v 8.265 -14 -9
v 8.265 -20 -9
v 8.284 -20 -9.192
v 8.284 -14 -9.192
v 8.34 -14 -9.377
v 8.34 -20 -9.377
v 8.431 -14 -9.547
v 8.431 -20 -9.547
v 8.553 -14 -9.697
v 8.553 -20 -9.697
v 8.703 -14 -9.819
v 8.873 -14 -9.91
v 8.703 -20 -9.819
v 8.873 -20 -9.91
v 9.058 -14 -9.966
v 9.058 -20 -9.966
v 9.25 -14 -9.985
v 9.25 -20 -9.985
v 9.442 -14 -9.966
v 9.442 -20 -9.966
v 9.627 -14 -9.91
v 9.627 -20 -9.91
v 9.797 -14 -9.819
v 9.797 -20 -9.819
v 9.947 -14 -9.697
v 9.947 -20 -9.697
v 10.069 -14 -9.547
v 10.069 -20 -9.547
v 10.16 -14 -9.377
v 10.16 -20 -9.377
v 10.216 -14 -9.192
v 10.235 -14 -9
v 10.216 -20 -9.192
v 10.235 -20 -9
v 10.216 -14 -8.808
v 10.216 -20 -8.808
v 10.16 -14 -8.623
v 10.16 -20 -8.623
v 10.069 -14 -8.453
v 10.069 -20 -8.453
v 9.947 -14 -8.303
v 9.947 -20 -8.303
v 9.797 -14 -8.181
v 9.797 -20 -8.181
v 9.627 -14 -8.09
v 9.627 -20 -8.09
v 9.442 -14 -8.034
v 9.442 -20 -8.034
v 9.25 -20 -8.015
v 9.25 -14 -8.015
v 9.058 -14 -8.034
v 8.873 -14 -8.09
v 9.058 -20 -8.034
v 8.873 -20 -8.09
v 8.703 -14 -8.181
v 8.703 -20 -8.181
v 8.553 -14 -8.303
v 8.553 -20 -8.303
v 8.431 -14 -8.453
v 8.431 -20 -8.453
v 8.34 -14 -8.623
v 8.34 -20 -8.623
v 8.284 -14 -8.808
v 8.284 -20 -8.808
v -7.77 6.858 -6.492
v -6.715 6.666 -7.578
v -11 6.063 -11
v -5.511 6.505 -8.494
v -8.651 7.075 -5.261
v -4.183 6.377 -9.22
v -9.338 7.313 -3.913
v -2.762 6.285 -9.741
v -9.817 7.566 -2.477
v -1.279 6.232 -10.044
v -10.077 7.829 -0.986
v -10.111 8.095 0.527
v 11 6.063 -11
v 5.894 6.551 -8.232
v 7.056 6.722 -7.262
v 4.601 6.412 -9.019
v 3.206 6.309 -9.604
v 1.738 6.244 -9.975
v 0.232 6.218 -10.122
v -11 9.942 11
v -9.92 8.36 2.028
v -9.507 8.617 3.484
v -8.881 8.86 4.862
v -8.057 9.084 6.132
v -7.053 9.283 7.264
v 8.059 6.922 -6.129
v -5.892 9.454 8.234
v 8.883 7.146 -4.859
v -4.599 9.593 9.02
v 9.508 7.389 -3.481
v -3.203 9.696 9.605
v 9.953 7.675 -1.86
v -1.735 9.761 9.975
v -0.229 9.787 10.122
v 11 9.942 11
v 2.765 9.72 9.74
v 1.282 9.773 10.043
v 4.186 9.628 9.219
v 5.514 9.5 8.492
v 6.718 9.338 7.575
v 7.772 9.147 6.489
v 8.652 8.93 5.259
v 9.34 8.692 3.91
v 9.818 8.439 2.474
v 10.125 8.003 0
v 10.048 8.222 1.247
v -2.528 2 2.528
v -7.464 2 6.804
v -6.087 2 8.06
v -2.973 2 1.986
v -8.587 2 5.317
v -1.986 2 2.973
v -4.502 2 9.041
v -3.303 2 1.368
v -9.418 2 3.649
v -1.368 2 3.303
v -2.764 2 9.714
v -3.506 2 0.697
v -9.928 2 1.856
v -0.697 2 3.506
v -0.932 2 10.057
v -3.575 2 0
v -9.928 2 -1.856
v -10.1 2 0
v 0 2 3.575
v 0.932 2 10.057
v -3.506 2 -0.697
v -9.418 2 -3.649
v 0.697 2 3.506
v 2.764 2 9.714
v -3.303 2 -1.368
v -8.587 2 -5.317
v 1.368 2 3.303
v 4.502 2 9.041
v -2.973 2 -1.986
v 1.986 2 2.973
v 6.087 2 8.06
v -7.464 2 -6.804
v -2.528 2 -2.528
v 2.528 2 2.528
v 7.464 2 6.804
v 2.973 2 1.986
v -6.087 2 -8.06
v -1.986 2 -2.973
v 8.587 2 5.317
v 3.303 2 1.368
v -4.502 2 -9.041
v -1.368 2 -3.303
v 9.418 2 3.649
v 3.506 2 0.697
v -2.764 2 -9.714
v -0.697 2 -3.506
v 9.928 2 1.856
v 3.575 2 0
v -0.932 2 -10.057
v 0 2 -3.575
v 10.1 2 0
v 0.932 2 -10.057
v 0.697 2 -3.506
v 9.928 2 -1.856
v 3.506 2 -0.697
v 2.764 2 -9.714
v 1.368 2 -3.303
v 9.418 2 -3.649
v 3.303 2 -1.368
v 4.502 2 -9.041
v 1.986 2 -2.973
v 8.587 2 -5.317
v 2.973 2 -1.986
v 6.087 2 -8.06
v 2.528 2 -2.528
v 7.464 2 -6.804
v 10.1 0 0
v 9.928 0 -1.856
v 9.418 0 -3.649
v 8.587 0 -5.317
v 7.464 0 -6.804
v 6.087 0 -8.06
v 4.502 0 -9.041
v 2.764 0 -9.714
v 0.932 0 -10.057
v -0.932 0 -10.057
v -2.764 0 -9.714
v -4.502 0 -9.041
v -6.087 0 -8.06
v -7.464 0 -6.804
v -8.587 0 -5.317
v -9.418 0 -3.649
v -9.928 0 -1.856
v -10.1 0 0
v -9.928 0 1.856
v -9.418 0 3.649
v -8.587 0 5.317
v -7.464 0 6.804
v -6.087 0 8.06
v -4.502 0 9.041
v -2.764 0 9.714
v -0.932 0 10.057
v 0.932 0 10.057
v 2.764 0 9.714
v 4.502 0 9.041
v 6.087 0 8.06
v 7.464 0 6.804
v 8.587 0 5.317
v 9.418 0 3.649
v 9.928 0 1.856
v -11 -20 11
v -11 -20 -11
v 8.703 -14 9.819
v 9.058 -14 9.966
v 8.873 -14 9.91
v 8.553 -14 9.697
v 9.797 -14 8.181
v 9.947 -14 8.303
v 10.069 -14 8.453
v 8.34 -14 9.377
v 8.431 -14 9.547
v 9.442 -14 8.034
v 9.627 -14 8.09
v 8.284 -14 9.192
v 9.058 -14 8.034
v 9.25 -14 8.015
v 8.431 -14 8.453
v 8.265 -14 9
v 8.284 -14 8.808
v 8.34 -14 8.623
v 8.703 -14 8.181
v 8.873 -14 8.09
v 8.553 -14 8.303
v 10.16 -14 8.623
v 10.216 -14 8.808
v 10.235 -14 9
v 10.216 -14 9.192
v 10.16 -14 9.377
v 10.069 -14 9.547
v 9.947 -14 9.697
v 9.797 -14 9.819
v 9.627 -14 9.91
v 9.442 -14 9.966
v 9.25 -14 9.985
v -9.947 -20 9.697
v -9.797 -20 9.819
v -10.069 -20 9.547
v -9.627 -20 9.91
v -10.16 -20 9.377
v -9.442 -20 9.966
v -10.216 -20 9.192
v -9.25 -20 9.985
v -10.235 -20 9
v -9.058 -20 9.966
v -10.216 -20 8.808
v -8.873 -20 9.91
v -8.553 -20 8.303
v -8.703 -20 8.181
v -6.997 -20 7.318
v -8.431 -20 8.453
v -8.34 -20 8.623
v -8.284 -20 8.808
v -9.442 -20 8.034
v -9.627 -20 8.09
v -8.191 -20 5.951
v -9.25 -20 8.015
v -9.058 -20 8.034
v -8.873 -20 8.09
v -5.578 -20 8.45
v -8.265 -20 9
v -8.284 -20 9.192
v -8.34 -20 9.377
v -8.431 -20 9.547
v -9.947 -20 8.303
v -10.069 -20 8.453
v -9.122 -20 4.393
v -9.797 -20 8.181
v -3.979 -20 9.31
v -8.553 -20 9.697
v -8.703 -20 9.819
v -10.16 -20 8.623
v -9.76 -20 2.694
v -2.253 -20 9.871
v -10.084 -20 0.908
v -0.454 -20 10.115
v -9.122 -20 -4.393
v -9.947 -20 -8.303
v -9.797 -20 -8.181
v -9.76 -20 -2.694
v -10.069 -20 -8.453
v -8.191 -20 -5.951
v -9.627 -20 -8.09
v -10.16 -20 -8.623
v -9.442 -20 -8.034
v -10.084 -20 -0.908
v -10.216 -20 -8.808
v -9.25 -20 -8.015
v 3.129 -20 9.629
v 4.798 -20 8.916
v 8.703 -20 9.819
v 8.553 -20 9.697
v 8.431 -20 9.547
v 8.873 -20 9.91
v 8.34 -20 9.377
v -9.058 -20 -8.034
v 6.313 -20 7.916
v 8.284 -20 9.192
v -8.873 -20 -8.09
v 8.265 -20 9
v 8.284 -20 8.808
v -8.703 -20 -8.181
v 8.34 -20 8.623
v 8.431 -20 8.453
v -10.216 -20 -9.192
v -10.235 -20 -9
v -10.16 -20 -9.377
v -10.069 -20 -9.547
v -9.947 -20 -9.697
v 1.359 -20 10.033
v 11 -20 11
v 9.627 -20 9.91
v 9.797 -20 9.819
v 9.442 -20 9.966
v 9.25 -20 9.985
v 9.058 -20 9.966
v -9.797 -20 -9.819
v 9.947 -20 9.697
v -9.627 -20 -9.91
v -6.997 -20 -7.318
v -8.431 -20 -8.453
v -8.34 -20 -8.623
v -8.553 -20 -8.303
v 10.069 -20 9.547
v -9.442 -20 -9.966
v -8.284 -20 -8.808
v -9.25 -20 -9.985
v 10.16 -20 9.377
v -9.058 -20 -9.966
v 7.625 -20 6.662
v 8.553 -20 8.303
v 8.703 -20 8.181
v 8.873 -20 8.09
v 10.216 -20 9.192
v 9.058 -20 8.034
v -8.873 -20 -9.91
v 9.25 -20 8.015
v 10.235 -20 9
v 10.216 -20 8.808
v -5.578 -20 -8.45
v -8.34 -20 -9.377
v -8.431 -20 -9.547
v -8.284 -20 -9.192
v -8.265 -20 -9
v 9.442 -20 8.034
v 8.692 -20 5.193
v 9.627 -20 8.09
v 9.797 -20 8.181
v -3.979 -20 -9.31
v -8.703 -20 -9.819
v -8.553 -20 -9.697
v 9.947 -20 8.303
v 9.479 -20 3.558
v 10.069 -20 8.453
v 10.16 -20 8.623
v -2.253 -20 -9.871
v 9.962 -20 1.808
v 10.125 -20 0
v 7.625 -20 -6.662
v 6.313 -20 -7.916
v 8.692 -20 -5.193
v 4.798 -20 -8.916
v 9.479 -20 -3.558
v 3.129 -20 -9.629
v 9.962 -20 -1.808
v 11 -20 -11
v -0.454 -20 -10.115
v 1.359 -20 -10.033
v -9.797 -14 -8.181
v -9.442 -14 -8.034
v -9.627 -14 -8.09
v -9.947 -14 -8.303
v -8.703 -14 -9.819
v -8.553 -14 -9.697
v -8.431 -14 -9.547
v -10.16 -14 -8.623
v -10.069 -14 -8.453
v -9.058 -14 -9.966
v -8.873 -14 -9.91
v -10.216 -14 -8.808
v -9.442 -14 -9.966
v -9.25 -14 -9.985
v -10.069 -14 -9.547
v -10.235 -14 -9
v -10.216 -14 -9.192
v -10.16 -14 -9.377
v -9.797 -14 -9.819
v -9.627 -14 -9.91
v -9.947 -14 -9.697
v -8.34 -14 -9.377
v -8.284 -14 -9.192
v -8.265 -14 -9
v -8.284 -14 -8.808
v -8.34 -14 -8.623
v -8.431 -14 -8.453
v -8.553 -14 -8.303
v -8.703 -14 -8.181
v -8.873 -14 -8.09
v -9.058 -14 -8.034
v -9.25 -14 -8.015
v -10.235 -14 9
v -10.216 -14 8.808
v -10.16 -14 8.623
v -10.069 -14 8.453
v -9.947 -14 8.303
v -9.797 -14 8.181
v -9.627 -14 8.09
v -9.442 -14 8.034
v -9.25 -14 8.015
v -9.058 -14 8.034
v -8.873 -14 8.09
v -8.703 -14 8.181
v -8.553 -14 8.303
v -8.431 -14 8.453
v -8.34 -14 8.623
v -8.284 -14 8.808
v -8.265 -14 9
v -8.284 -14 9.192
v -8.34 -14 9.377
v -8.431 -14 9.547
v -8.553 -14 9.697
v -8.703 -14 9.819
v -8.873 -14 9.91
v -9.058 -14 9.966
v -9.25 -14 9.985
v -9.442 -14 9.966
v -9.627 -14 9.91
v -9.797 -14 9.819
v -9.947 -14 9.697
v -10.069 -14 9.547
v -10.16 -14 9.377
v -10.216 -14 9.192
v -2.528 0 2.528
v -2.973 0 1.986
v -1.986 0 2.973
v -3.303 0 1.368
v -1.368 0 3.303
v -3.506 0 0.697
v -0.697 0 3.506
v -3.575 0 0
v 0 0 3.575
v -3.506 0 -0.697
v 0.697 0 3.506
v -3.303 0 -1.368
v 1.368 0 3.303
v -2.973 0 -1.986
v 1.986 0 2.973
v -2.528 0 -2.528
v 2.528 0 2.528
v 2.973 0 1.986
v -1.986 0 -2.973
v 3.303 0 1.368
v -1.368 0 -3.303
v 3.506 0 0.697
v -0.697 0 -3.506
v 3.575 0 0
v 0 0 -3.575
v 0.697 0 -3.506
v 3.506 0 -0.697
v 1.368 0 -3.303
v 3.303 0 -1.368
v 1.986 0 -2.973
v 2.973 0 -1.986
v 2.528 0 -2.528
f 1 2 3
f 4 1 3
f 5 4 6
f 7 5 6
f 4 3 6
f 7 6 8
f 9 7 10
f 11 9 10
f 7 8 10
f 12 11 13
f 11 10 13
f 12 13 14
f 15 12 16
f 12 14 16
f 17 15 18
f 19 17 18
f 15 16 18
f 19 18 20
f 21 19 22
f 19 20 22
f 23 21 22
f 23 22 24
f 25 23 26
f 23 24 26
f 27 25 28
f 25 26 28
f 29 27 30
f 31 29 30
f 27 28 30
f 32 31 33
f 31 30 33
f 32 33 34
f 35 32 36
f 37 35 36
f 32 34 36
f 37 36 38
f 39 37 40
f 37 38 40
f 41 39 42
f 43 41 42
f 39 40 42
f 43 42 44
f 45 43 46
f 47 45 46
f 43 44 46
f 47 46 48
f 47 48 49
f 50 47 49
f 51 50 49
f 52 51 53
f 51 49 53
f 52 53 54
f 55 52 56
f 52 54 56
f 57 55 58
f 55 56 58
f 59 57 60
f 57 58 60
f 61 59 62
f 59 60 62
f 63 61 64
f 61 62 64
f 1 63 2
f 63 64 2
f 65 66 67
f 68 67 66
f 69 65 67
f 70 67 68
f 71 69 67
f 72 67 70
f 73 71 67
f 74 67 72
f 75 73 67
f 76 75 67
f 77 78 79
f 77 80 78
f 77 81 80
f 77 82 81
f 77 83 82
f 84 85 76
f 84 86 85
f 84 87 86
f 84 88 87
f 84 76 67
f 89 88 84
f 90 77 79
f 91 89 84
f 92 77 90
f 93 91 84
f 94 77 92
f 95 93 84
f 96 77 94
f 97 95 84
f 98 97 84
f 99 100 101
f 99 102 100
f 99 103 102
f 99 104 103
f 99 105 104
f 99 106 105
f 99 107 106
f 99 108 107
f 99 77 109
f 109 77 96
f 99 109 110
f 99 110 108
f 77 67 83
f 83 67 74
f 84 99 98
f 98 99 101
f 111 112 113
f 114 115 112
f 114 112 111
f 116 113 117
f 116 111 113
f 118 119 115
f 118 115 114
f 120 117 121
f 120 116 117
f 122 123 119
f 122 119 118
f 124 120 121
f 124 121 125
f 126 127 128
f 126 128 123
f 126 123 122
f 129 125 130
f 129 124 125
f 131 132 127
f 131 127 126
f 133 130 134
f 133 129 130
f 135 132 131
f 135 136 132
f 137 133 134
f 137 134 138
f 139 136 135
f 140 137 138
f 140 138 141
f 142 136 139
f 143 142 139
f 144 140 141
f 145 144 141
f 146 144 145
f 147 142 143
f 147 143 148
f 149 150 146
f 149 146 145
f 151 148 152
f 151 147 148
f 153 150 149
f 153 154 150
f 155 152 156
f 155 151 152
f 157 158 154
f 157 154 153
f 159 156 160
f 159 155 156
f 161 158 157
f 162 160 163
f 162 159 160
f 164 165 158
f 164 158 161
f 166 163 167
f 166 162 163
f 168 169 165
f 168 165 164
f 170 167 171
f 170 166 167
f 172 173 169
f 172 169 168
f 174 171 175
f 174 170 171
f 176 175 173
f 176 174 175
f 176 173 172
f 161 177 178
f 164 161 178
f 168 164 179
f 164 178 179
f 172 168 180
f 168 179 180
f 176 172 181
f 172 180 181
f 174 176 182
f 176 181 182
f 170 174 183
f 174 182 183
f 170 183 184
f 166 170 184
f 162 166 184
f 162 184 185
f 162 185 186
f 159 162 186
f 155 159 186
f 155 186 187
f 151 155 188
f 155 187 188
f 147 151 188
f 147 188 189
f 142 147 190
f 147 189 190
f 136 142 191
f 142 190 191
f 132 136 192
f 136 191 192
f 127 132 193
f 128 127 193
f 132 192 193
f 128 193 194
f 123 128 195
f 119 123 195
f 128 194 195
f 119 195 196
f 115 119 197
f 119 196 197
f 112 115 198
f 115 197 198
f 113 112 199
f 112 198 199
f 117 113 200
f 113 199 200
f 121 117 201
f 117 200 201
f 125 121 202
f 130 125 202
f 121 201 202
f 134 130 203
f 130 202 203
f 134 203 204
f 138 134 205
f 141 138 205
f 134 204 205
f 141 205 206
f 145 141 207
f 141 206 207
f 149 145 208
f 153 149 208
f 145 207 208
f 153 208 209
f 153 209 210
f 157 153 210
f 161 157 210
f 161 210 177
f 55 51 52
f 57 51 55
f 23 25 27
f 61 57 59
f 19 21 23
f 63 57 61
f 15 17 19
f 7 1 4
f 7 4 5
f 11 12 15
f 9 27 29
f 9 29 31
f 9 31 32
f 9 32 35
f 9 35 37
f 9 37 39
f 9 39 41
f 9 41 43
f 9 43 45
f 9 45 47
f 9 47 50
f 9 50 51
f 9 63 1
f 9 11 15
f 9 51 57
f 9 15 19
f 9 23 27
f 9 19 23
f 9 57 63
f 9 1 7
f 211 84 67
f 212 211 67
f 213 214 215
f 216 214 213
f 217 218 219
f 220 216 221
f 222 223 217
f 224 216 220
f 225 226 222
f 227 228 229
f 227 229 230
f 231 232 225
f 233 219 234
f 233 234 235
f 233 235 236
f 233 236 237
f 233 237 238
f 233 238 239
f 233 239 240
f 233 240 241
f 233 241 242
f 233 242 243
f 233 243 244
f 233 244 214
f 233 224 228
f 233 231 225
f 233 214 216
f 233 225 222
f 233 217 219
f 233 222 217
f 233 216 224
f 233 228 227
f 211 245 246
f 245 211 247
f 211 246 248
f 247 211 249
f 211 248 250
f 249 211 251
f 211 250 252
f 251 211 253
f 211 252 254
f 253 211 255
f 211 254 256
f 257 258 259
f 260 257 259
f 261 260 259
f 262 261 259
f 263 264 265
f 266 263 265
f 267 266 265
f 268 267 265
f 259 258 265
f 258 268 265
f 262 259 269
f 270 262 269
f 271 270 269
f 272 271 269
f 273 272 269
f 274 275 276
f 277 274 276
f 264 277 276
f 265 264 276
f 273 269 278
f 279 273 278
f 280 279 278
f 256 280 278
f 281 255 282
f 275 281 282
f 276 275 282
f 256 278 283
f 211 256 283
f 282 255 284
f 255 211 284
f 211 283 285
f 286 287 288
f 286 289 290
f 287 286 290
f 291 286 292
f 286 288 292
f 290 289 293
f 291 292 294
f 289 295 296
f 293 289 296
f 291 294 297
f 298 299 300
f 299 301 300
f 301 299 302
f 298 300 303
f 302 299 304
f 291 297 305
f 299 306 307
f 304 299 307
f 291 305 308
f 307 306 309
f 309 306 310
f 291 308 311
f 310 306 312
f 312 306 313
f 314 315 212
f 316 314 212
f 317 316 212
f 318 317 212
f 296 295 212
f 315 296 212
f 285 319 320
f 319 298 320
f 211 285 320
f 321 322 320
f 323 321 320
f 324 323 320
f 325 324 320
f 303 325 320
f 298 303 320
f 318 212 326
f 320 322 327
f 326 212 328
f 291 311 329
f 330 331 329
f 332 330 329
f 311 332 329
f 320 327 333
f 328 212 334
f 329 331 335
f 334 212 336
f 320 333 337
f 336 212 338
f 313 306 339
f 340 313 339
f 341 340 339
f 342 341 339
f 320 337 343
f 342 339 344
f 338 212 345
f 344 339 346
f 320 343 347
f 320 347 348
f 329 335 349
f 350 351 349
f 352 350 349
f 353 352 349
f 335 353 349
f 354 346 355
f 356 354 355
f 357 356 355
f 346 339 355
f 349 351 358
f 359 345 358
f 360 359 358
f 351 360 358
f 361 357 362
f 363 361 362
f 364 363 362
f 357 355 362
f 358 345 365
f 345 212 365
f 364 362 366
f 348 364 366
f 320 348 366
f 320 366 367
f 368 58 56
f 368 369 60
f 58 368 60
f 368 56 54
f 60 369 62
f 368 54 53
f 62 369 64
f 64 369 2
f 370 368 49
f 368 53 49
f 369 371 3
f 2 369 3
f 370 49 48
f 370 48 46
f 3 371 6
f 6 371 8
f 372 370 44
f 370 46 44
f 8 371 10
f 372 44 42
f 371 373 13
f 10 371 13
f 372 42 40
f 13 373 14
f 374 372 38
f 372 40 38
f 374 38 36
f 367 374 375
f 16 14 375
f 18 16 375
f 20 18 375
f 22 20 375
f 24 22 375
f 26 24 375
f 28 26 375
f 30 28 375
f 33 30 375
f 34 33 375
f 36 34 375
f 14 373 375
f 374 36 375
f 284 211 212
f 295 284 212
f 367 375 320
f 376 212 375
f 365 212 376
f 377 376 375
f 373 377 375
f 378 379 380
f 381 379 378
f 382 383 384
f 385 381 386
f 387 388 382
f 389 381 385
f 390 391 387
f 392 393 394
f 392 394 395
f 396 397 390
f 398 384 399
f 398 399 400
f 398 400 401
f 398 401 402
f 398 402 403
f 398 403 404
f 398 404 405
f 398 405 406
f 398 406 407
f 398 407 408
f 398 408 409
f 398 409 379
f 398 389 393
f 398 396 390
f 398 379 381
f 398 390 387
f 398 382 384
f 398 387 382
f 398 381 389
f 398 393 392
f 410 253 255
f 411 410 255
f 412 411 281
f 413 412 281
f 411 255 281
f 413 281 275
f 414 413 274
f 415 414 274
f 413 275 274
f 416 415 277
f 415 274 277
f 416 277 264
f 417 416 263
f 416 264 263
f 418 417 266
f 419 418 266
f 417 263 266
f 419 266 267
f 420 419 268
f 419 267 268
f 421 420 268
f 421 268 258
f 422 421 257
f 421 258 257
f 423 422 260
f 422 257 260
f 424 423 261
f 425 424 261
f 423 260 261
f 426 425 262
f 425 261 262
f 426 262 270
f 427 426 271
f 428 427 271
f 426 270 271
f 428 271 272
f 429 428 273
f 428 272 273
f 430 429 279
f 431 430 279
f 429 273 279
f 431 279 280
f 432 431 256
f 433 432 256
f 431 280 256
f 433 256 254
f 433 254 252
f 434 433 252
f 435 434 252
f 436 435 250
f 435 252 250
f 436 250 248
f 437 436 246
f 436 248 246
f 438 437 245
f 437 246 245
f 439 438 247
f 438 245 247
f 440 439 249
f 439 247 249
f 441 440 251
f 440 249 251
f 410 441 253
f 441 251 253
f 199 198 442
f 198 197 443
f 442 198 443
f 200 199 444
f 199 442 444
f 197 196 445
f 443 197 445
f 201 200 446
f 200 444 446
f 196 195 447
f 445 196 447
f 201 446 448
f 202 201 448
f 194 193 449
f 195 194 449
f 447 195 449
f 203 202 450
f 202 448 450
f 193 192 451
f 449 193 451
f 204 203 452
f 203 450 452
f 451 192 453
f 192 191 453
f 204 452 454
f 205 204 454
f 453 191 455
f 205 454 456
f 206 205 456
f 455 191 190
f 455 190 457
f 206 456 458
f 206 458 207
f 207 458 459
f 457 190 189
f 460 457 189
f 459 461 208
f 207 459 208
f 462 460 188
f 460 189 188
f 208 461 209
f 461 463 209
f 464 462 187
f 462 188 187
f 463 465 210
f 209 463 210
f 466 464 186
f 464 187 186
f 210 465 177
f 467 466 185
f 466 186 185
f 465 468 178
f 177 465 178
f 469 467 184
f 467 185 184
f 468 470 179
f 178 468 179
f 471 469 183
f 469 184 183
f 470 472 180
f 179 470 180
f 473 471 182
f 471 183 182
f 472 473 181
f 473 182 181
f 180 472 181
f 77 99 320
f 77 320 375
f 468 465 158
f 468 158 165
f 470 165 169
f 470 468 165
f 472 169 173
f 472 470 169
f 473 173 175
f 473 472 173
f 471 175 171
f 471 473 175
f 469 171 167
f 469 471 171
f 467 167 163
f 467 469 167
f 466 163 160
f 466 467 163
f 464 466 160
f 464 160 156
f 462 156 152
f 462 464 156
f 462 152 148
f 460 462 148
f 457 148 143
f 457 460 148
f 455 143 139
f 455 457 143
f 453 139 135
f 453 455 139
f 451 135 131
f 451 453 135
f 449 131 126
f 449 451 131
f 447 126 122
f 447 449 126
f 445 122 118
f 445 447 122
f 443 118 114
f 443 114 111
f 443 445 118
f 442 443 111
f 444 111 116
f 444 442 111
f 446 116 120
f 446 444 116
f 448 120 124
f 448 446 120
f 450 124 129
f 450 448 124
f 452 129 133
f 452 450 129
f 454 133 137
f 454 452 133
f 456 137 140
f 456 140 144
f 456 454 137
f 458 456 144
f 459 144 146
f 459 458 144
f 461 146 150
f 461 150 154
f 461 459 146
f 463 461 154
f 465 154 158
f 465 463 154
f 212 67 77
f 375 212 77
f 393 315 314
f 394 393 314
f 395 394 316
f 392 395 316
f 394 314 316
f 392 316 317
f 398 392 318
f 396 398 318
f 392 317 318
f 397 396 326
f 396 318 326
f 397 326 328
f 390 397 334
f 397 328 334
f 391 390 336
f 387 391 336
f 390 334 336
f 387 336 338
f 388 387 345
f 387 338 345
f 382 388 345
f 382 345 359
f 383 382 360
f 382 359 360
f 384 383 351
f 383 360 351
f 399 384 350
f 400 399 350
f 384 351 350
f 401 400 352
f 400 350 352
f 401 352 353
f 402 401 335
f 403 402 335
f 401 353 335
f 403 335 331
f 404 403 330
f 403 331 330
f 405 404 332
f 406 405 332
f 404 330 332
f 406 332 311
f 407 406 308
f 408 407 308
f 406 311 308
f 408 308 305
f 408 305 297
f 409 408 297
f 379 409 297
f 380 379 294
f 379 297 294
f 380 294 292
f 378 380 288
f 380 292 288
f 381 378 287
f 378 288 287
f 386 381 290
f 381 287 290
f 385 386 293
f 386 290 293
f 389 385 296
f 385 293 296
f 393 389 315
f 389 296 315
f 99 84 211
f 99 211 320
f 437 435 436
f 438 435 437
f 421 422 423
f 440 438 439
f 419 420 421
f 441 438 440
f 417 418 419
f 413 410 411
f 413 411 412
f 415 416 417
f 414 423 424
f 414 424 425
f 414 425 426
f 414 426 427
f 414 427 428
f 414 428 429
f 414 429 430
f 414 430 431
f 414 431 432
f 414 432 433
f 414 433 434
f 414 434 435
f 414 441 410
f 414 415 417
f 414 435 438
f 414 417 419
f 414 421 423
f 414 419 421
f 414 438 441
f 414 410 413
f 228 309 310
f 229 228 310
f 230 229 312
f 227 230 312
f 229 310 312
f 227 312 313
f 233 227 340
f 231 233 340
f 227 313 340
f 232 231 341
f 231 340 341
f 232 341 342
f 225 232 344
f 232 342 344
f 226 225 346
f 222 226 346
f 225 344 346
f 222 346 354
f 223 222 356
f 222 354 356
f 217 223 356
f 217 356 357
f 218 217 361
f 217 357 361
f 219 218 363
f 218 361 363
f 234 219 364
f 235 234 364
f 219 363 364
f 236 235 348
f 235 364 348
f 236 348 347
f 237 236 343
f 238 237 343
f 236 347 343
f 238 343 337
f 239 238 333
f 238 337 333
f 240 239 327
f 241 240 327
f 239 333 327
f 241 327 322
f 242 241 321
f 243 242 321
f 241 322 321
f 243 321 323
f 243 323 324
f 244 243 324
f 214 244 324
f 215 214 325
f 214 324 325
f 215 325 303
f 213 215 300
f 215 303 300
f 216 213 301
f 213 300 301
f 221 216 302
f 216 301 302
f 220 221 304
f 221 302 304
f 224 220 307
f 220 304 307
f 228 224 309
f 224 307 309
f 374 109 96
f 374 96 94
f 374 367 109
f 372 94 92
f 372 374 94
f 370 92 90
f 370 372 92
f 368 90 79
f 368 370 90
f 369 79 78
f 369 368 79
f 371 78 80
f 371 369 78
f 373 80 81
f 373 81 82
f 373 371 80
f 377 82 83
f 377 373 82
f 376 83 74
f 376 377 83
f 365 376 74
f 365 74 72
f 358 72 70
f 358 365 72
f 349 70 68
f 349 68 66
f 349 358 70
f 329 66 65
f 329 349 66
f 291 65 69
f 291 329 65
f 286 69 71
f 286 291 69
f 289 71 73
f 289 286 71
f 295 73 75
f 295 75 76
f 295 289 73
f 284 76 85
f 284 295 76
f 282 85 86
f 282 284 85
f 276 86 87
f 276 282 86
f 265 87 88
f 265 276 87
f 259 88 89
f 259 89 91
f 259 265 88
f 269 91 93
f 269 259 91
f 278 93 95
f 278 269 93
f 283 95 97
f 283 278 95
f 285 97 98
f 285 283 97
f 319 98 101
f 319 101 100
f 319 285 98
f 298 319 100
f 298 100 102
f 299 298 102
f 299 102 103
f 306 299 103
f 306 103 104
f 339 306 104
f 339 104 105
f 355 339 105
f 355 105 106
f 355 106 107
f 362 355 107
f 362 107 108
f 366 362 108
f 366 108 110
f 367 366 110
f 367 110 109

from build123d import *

# Parameters (mm, degrees)
SKETCH2_R                = 10.1
SKETCH2_R_2              = 3.575
BOSS_EXTRUDE1_DEPTH      = 2
SKETCH3_W                = 22
SKETCH3_H                = 22
SKETCH3_R                = 10.125
BOSS_EXTRUDE2_DEPTH      = 8
BOSS_EXTRUDE2_DEPTH_BACK = 22
SKETCH5_R                = 0.985
CUT_EXTRUDE2_DEPTH       = 6
CUT_EXTRUDE3_DEPTH       = 23


with BuildPart() as part:
    # Sketch2 → Boss-Extrude1 (new body)
    with BuildSketch(Plane(origin=(0, 0, 0), x_dir=(1, 0, 0), z_dir=(0, 1, 0))):
        Circle(SKETCH2_R)
        Circle(SKETCH2_R_2, mode=Mode.SUBTRACT)
    extrude(amount=BOSS_EXTRUDE1_DEPTH)


with BuildPart() as body_2:
    # Sketch3 → Boss-Extrude2 (new body, two sides)
    with BuildSketch(Plane(origin=(0, 2, 0), x_dir=(1, 0, 0), z_dir=(0, 1, 0))) as boss_extrude2_sk:
        Rectangle(SKETCH3_W, SKETCH3_H)
        Circle(SKETCH3_R, mode=Mode.SUBTRACT)
    extrude(amount=BOSS_EXTRUDE2_DEPTH)
    extrude(boss_extrude2_sk.sketch, amount=-BOSS_EXTRUDE2_DEPTH_BACK)

    # Sketch5 → Cut-Extrude2 (cut)
    with BuildSketch(Plane(origin=(0, -20, 0), x_dir=(-1, 0, 0), z_dir=(0, -1, 0))):
        with Locations((9.25, -9)):
            Circle(SKETCH5_R)
        with Locations((9.25, 9)):
            Circle(SKETCH5_R)
        with Locations((-9.25, 9)):
            Circle(SKETCH5_R)
        with Locations((-9.25, -9)):
            Circle(SKETCH5_R)
    extrude(amount=-CUT_EXTRUDE2_DEPTH, mode=Mode.SUBTRACT)

    # Sketch6 → Cut-Extrude3 (cut, through all)
    with BuildSketch(Plane(origin=(11, 0, 0), x_dir=(0, 0, -1), z_dir=(1, 0, 0))):
        Polygon((11, 6.06291723), (-11, 9.942110806), (-11, 10), (11, 10), align=None)
    extrude(amount=-CUT_EXTRUDE3_DEPTH, mode=Mode.SUBTRACT)


solid = Compound([part.part, body_2.part])
